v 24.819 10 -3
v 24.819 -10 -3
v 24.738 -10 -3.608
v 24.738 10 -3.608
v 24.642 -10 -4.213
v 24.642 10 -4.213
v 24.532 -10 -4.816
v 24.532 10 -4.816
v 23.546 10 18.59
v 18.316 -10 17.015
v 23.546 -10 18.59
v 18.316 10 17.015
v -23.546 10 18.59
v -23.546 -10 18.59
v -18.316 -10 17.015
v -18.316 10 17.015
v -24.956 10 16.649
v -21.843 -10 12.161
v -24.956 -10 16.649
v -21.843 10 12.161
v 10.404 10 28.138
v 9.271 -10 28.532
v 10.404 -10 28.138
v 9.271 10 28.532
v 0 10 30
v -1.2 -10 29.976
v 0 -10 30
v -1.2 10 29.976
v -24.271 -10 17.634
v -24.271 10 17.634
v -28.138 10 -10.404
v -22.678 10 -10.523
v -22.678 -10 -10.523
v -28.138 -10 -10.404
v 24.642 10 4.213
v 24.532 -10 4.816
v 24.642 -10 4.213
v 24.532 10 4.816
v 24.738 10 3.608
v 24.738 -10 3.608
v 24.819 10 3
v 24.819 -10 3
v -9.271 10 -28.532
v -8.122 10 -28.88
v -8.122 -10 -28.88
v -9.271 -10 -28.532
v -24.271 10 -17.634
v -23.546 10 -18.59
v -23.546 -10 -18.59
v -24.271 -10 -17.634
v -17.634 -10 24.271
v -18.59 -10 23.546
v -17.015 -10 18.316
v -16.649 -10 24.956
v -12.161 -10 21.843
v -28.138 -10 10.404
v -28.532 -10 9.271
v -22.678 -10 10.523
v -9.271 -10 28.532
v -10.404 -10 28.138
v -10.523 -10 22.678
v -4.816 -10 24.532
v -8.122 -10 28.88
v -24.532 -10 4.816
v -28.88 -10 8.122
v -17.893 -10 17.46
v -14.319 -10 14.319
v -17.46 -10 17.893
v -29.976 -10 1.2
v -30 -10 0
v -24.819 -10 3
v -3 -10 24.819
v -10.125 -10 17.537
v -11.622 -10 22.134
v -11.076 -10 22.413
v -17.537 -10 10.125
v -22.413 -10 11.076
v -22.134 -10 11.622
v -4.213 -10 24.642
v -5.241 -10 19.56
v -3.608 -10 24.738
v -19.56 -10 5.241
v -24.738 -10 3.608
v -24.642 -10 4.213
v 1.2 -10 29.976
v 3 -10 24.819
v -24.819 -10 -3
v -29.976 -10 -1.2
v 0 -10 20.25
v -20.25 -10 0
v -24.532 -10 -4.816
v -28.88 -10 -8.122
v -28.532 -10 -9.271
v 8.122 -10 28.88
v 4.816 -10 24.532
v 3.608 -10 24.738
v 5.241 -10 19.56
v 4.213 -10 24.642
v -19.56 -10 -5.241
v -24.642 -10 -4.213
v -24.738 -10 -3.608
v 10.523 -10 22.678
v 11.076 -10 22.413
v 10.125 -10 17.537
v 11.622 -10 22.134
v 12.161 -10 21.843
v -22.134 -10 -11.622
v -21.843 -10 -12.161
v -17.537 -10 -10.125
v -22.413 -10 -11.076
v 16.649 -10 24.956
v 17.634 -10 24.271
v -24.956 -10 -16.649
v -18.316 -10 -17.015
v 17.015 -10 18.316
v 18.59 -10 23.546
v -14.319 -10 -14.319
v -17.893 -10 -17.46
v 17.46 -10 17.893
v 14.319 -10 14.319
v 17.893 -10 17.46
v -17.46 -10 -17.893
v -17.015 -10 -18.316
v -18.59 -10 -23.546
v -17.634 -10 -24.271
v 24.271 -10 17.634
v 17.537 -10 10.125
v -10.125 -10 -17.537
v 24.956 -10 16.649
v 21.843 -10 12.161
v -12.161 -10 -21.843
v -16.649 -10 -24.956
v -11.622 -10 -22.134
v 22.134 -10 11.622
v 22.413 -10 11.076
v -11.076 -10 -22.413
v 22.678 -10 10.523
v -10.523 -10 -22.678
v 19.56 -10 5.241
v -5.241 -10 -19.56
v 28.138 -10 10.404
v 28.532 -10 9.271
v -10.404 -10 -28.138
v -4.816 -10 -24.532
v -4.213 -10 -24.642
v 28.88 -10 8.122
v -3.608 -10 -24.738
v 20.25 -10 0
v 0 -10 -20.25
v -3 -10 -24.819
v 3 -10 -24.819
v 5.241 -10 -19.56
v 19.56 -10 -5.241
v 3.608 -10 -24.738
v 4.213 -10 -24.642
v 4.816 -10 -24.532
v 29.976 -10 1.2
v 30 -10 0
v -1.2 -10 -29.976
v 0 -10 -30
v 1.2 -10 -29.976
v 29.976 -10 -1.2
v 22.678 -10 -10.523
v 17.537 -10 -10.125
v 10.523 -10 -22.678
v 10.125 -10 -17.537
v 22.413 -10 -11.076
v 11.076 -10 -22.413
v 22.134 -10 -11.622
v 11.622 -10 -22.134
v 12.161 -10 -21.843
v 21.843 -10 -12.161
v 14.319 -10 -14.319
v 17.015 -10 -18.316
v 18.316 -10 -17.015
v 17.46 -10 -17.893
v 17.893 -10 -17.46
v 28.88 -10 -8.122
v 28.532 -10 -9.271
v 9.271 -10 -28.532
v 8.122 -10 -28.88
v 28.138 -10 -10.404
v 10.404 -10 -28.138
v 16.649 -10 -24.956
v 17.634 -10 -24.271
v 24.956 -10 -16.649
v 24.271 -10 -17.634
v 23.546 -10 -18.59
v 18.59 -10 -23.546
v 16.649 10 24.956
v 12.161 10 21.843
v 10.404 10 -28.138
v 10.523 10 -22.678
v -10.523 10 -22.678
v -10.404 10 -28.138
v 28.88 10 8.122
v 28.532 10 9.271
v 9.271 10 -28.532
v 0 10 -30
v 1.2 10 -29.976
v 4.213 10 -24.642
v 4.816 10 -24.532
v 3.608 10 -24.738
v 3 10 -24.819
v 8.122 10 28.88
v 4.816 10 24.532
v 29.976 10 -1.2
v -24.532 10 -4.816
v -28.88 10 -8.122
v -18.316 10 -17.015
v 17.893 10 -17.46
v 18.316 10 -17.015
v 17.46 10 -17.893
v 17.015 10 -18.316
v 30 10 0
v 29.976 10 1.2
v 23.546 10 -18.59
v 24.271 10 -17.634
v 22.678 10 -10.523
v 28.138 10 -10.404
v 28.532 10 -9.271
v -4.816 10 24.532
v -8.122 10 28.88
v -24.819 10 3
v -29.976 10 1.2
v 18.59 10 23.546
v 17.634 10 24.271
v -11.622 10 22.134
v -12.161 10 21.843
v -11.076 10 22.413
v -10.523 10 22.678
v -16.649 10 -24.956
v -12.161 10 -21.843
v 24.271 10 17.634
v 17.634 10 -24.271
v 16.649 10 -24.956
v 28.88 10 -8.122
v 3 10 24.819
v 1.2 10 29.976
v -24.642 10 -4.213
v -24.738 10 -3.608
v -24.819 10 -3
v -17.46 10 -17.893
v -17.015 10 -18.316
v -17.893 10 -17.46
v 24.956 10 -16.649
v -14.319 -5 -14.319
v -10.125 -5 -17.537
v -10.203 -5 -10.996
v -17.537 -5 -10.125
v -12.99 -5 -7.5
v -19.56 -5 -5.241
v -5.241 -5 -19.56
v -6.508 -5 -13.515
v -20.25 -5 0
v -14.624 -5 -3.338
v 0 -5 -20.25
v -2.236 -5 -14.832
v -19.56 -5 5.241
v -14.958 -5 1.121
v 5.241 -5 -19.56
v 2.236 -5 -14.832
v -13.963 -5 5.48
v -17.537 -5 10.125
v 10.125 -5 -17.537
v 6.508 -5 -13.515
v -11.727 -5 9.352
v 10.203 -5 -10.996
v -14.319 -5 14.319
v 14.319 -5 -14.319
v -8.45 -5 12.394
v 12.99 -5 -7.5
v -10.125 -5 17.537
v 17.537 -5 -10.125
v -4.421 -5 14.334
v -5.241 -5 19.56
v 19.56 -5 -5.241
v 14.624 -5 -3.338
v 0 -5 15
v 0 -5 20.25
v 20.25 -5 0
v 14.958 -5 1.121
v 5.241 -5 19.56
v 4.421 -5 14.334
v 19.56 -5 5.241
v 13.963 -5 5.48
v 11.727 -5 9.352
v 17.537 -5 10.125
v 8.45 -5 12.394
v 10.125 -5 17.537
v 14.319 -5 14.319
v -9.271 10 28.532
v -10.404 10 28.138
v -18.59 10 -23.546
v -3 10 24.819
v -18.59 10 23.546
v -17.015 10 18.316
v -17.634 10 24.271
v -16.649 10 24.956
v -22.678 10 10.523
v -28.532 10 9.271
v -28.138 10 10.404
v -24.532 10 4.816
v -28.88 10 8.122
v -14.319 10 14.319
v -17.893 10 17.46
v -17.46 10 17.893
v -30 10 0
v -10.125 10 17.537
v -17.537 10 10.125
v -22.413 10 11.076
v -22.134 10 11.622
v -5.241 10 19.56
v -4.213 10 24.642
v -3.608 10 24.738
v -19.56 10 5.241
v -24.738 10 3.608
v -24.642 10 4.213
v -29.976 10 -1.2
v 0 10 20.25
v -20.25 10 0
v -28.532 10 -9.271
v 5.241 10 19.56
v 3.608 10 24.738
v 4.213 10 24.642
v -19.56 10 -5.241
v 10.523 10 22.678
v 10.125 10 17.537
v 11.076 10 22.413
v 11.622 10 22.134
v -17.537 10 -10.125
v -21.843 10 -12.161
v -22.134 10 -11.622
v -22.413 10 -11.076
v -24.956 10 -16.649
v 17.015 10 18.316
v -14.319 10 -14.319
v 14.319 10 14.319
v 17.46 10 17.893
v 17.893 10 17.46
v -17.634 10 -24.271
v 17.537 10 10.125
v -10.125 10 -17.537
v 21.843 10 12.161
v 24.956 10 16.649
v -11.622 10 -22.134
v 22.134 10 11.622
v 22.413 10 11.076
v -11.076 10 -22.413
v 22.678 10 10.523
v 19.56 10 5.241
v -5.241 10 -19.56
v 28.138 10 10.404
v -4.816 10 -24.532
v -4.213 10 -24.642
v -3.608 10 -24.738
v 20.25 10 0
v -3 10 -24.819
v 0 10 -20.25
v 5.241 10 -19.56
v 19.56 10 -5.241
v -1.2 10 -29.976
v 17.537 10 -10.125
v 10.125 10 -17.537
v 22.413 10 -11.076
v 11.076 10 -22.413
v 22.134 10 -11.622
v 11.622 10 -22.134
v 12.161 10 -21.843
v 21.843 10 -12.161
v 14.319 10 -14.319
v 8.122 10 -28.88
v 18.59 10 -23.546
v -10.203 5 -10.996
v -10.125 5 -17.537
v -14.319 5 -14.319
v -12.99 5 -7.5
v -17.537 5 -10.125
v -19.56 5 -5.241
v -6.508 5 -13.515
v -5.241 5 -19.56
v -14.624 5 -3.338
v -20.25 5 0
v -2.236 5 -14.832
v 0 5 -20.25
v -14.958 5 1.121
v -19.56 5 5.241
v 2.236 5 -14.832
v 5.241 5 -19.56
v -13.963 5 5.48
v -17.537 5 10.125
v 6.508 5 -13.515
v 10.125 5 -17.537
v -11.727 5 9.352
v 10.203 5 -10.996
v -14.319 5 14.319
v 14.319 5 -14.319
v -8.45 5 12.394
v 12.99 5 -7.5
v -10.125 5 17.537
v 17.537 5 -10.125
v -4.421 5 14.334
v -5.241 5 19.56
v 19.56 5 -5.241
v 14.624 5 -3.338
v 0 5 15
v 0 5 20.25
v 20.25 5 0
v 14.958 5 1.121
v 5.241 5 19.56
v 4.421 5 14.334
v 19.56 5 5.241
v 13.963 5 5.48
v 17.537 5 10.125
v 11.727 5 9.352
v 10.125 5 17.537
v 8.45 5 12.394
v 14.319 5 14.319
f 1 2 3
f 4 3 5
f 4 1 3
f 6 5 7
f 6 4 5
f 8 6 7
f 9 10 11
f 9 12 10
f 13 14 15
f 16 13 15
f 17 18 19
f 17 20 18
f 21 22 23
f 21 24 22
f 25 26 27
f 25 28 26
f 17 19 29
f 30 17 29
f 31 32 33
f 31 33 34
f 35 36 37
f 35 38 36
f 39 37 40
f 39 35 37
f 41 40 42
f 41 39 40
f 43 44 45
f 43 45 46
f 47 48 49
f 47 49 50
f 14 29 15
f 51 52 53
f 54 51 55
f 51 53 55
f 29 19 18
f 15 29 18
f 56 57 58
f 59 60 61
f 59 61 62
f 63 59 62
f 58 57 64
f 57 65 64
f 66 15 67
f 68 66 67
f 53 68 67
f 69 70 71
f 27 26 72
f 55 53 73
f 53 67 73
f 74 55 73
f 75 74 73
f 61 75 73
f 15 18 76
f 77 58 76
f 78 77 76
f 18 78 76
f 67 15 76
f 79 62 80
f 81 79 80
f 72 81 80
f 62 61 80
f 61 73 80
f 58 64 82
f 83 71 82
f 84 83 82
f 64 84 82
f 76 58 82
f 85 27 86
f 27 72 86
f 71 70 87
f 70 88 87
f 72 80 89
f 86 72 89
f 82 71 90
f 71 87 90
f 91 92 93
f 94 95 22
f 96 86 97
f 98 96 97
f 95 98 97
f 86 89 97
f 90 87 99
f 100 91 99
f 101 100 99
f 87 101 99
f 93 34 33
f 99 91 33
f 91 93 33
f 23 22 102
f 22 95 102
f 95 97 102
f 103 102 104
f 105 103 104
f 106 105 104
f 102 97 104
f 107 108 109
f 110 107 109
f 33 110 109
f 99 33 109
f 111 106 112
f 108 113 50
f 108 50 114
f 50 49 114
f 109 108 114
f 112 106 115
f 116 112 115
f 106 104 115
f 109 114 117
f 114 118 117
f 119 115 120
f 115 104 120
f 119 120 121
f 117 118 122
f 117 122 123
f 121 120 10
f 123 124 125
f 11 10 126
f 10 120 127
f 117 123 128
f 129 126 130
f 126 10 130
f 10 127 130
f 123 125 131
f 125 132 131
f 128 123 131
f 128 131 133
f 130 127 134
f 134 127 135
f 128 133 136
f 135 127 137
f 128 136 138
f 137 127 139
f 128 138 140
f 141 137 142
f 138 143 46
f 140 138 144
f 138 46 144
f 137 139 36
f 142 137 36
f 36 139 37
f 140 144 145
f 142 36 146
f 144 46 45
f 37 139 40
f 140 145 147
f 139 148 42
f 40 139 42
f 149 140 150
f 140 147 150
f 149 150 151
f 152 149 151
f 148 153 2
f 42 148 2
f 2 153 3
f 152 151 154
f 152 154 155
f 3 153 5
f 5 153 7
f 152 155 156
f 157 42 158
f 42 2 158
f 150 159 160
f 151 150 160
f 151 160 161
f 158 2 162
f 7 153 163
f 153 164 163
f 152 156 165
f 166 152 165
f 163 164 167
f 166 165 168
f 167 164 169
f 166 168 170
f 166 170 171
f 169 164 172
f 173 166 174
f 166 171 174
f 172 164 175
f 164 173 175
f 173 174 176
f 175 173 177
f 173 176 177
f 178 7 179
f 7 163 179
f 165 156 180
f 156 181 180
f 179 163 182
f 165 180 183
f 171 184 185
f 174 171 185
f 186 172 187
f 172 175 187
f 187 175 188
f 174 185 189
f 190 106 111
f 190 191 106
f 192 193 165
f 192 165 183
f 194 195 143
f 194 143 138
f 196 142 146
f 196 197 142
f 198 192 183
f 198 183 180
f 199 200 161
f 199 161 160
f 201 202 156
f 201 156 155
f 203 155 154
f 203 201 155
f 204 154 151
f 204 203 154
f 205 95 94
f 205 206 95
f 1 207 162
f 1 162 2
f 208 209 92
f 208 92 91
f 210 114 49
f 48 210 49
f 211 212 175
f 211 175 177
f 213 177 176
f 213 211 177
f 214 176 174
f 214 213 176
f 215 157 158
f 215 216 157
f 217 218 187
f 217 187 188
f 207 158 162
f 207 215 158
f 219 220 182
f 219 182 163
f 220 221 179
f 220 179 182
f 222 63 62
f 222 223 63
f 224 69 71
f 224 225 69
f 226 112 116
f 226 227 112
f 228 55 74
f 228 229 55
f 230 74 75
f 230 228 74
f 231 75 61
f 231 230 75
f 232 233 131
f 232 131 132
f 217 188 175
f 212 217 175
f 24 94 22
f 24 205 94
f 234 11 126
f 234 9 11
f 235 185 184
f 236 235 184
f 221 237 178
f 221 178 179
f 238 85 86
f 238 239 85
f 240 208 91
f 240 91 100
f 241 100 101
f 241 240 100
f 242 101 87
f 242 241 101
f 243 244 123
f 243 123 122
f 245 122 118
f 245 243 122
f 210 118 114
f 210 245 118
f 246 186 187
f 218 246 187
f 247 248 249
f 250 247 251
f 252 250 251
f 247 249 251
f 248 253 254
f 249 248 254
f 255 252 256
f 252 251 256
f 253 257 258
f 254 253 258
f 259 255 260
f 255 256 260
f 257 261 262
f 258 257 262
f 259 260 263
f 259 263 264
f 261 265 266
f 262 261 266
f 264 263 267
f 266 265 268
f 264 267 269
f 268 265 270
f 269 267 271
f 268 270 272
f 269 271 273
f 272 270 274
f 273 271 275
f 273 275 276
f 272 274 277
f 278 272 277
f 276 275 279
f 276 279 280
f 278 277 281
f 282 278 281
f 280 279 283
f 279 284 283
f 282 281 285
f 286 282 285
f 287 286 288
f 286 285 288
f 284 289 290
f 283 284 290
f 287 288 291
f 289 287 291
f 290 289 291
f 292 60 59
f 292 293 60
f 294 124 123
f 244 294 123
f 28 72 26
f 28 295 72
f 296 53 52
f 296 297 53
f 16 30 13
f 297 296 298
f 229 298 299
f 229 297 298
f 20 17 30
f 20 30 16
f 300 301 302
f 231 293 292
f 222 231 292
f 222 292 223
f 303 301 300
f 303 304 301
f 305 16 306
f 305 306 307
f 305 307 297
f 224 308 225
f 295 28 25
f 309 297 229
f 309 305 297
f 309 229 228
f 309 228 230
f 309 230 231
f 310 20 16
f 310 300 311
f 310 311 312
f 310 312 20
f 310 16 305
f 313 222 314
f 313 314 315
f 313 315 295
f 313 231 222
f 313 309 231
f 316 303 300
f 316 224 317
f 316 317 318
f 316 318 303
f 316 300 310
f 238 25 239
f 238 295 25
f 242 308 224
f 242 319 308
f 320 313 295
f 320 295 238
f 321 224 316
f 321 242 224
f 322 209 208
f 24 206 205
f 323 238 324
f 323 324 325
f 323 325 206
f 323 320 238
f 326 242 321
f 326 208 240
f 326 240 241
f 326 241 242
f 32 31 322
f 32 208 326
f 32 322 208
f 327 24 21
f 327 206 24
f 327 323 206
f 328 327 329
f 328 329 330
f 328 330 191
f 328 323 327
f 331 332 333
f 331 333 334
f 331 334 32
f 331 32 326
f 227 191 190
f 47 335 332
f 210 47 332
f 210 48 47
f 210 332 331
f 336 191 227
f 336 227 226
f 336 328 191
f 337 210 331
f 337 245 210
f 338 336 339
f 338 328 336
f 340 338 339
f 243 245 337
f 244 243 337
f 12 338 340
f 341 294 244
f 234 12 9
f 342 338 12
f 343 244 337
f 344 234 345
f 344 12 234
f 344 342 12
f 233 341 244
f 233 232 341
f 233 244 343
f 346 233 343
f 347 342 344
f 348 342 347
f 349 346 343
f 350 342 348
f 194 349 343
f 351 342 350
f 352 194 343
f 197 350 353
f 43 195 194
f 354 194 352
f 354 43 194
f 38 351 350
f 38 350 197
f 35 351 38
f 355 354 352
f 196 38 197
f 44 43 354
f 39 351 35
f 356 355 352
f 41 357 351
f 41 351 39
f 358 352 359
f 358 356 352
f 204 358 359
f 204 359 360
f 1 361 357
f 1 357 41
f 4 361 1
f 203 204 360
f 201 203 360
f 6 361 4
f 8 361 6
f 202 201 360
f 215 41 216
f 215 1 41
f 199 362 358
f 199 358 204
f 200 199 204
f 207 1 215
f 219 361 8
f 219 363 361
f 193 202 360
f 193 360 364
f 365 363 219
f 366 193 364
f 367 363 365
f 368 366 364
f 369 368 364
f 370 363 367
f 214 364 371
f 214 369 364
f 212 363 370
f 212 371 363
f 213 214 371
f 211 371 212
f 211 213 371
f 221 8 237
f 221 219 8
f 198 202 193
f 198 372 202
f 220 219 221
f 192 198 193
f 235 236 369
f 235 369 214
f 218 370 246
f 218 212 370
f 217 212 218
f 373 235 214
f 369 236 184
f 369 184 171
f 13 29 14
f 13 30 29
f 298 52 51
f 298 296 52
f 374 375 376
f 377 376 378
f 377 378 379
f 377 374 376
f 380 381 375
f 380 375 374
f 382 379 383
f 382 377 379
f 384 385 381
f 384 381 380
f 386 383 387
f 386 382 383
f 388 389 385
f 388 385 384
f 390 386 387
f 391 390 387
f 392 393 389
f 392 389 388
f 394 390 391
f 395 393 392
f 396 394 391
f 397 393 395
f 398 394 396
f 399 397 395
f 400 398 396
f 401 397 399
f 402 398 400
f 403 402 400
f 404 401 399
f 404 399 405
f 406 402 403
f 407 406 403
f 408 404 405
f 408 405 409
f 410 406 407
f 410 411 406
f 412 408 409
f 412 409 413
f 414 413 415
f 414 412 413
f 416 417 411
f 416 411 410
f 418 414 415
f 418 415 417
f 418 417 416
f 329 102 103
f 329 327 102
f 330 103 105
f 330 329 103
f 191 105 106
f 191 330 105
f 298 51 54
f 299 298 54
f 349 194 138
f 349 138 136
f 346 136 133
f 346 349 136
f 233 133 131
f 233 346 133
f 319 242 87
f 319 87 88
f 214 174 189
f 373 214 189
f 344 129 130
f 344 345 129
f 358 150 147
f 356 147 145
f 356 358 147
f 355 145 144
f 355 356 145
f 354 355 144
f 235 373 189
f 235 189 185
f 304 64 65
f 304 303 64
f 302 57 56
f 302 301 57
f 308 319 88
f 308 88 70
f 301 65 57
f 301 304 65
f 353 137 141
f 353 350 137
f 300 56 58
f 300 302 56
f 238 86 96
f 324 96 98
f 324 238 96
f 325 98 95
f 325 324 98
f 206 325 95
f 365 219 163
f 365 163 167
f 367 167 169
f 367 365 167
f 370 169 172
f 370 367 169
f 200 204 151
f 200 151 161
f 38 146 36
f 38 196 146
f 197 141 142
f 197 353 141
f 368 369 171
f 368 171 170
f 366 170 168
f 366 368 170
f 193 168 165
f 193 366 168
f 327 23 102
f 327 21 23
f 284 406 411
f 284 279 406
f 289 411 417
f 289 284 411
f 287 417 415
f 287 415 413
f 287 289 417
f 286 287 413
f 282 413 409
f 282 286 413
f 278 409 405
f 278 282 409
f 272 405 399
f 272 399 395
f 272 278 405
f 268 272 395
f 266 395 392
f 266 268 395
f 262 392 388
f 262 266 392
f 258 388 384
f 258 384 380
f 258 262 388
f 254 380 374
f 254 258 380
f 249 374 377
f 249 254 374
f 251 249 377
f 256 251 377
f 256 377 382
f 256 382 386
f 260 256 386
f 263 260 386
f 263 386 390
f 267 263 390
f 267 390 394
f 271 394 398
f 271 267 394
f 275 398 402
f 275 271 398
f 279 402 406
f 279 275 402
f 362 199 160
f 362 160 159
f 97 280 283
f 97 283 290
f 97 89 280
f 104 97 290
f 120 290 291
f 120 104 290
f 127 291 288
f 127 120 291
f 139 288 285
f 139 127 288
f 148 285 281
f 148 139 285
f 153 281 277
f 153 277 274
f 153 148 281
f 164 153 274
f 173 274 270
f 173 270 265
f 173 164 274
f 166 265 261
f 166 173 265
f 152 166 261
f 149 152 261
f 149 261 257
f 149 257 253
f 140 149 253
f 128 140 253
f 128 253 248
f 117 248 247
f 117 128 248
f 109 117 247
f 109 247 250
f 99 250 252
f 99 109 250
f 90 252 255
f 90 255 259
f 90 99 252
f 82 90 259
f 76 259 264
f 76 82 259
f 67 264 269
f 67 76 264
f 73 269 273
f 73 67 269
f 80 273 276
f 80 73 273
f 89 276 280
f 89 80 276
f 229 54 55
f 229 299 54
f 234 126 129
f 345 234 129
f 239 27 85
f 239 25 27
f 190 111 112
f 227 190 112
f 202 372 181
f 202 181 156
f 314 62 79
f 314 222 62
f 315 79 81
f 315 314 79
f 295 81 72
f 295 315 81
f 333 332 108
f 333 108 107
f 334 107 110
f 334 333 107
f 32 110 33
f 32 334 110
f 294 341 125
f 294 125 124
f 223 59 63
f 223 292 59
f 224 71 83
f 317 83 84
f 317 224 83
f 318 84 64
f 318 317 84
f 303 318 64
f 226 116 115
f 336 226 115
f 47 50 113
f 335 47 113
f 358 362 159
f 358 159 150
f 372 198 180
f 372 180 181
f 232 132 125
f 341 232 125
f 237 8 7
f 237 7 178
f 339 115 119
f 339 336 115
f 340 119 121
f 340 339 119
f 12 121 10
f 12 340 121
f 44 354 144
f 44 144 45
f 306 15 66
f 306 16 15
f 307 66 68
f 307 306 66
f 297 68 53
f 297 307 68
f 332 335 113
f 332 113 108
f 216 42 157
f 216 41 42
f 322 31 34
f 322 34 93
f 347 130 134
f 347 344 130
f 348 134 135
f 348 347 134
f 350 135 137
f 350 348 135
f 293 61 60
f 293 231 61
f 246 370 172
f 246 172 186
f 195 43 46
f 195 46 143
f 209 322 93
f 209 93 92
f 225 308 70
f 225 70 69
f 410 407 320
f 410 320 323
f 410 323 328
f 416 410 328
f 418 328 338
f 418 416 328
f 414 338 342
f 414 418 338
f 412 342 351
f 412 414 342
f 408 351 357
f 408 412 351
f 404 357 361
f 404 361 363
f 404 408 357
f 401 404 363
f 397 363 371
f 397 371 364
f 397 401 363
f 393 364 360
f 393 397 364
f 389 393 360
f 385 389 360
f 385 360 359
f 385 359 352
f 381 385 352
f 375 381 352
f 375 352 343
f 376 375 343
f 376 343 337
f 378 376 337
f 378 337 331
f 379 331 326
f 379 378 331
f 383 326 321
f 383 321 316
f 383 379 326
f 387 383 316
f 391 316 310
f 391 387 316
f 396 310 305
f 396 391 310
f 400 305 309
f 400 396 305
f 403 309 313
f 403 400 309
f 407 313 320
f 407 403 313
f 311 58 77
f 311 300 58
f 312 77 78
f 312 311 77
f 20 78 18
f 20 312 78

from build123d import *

# Parameters (mm, degrees)
SKETCH1_R           = 20.25
BOSS_EXTRUDE1_DEPTH = 10
SKETCH1_3_R         = 20.25
SKETCH1_3_R_2       = 15
BOSS_EXTRUDE2_DEPTH = 5


with BuildPart() as part:
    # Sketch1 → Boss-Extrude1 (new, symmetric)
    with BuildSketch(Plane(origin=(0, 0, 0), x_dir=(1, 0, 0), z_dir=(0, 1, 0))):
        with BuildLine():
            Line((29.976, -1.199759976), (30, 0))
            Line((30, 0), (29.976, 1.199759976))
            Line((29.976, 1.199759976), (24.819347292, 3))
            ThreePointArc((24.819347292, 3), (24.692208515, 3.910861626), (24.531652955, 4.816430554))
            Line((24.531652955, 4.816430554), (28.879616354, 8.12205388))
            Line((28.879616354, 8.12205388), (28.531695489, 9.270509831))
            Line((28.531695489, 9.270509831), (28.138123911, 10.404132967))
            Line((28.138123911, 10.404132967), (22.677550989, 10.522769651))
            ThreePointArc((22.677550989, 10.522769651), (22.275163105, 11.349762493), (21.842629505, 12.161395327))
            Line((21.842629505, 12.161395327), (24.956294644, 16.648824513))
            Line((24.956294644, 16.648824513), (24.270509831, 17.633557569))
            Line((24.270509831, 17.633557569), (23.545892203, 18.590076932))
            Line((23.545892203, 18.590076932), (18.315917992, 17.015497293))
            ThreePointArc((18.315917992, 17.015497293), (17.67766953, 17.67766953), (17.015497293, 18.315917992))
            Line((17.015497293, 18.315917992), (18.590076932, 23.545892203))
            Line((18.590076932, 23.545892203), (17.633557569, 24.270509831))
            Line((17.633557569, 24.270509831), (16.648824513, 24.956294644))
            Line((16.648824513, 24.956294644), (12.161395327, 21.842629505))
            ThreePointArc((12.161395327, 21.842629505), (11.349762493, 22.275163105), (10.522769651, 22.677550989))
            Line((10.522769651, 22.677550989), (10.404132967, 28.138123911))
            Line((10.404132967, 28.138123911), (9.270509831, 28.531695489))
            Line((9.270509831, 28.531695489), (8.12205388, 28.879616354))
            Line((8.12205388, 28.879616354), (4.816430554, 24.531652955))
            ThreePointArc((4.816430554, 24.531652955), (3.910861626, 24.692208515), (3, 24.819347292))
            Line((3, 24.819347292), (1.199759976, 29.976))
            Line((1.199759976, 29.976), (0, 30))
            Line((0, 30), (-1.199759976, 29.976))
            Line((-1.199759976, 29.976), (-3, 24.819347292))
            ThreePointArc((-3, 24.819347292), (-3.910861626, 24.692208515), (-4.816430554, 24.531652955))
            Line((-4.816430554, 24.531652955), (-8.12205388, 28.879616354))
            Line((-8.12205388, 28.879616354), (-9.270509831, 28.531695489))
            Line((-9.270509831, 28.531695489), (-10.404132967, 28.138123911))
            Line((-10.404132967, 28.138123911), (-10.522769651, 22.677550989))
            ThreePointArc((-10.522769651, 22.677550989), (-11.349762493, 22.275163105), (-12.161395327, 21.842629505))
            Line((-12.161395327, 21.842629505), (-16.648824513, 24.956294644))
            Line((-16.648824513, 24.956294644), (-17.633557569, 24.270509831))
            Line((-17.633557569, 24.270509831), (-18.590076932, 23.545892203))
            Line((-18.590076932, 23.545892203), (-17.015497293, 18.315917992))
            ThreePointArc((-17.015497293, 18.315917992), (-17.67766953, 17.67766953), (-18.315917992, 17.015497293))
            Line((-18.315917992, 17.015497293), (-23.545892203, 18.590076932))
            Line((-23.545892203, 18.590076932), (-24.270509831, 17.633557569))
            Line((-24.270509831, 17.633557569), (-24.956294644, 16.648824513))
            Line((-24.956294644, 16.648824513), (-21.842629505, 12.161395327))
            ThreePointArc((-21.842629505, 12.161395327), (-22.275163105, 11.349762493), (-22.677550989, 10.522769651))
            Line((-22.677550989, 10.522769651), (-28.138123911, 10.404132967))
            Line((-28.138123911, 10.404132967), (-28.531695489, 9.270509831))
            Line((-28.531695489, 9.270509831), (-28.879616354, 8.12205388))
            Line((-28.879616354, 8.12205388), (-24.531652955, 4.816430554))
            ThreePointArc((-24.531652955, 4.816430554), (-24.692208515, 3.910861626), (-24.819347292, 3))
            Line((-24.819347292, 3), (-29.976, 1.199759976))
            Line((-29.976, 1.199759976), (-30, 0))
            Line((-30, 0), (-29.976, -1.199759976))
            Line((-29.976, -1.199759976), (-24.819347292, -3))
            ThreePointArc((-24.819347292, -3), (-24.692208515, -3.910861626), (-24.531652955, -4.816430554))
            Line((-24.531652955, -4.816430554), (-28.879616354, -8.12205388))
            Line((-28.879616354, -8.12205388), (-28.531695489, -9.270509831))
            Line((-28.531695489, -9.270509831), (-28.138123911, -10.404132967))
            Line((-28.138123911, -10.404132967), (-22.677550989, -10.522769651))
            ThreePointArc((-22.677550989, -10.522769651), (-22.275163105, -11.349762493), (-21.842629505, -12.161395327))
            Line((-21.842629505, -12.161395327), (-24.956294644, -16.648824513))
            Line((-24.956294644, -16.648824513), (-24.270509831, -17.633557569))
            Line((-24.270509831, -17.633557569), (-23.545892203, -18.590076932))
            Line((-23.545892203, -18.590076932), (-18.315917992, -17.015497293))
            ThreePointArc((-18.315917992, -17.015497293), (-17.67766953, -17.67766953), (-17.015497293, -18.315917992))
            Line((-17.015497293, -18.315917992), (-18.590076932, -23.545892203))
            Line((-18.590076932, -23.545892203), (-17.633557569, -24.270509831))
            Line((-17.633557569, -24.270509831), (-16.648824513, -24.956294644))
            Line((-16.648824513, -24.956294644), (-12.161395327, -21.842629505))
            ThreePointArc((-12.161395327, -21.842629505), (-11.349762493, -22.275163105), (-10.522769651, -22.677550989))
            Line((-10.522769651, -22.677550989), (-10.404132967, -28.138123911))
            Line((-10.404132967, -28.138123911), (-9.270509831, -28.531695489))
            Line((-9.270509831, -28.531695489), (-8.12205388, -28.879616354))
            Line((-8.12205388, -28.879616354), (-4.816430554, -24.531652955))
            ThreePointArc((-4.816430554, -24.531652955), (-3.910861626, -24.692208515), (-3, -24.819347292))
            Line((-3, -24.819347292), (-1.199759976, -29.976))
            Line((-1.199759976, -29.976), (0, -30))
            Line((0, -30), (1.199759976, -29.976))
            Line((1.199759976, -29.976), (3, -24.819347292))
            ThreePointArc((3, -24.819347292), (3.910861626, -24.692208515), (4.816430554, -24.531652955))
            Line((4.816430554, -24.531652955), (8.12205388, -28.879616354))
            Line((8.12205388, -28.879616354), (9.270509831, -28.531695489))
            Line((9.270509831, -28.531695489), (10.404132967, -28.138123911))
            Line((10.404132967, -28.138123911), (10.522769651, -22.677550989))
            ThreePointArc((10.522769651, -22.677550989), (11.349762493, -22.275163105), (12.161395327, -21.842629505))
            Line((12.161395327, -21.842629505), (16.648824513, -24.956294644))
            Line((16.648824513, -24.956294644), (17.633557569, -24.270509831))
            Line((17.633557569, -24.270509831), (18.590076932, -23.545892203))
            Line((18.590076932, -23.545892203), (17.015497293, -18.315917992))
            ThreePointArc((17.015497293, -18.315917992), (17.67766953, -17.67766953), (18.315917992, -17.015497293))
            Line((18.315917992, -17.015497293), (23.545892203, -18.590076932))
            Line((23.545892203, -18.590076932), (24.270509831, -17.633557569))
            Line((24.270509831, -17.633557569), (24.956294644, -16.648824513))
            Line((24.956294644, -16.648824513), (21.842629505, -12.161395327))
            ThreePointArc((21.842629505, -12.161395327), (22.275163105, -11.349762493), (22.677550989, -10.522769651))
            Line((22.677550989, -10.522769651), (28.138123911, -10.404132967))
            Line((28.138123911, -10.404132967), (28.531695489, -9.270509831))
            Line((28.531695489, -9.270509831), (28.879616354, -8.12205388))
            Line((28.879616354, -8.12205388), (24.531652955, -4.816430554))
            ThreePointArc((24.531652955, -4.816430554), (24.692208515, -3.910861626), (24.819347292, -3))
            Line((24.819347292, -3), (29.976, -1.199759976))
        make_face()
        Circle(SKETCH1_R, mode=Mode.SUBTRACT)
    extrude(amount=BOSS_EXTRUDE1_DEPTH, both=True)

    # Sketch1<3> → Boss-Extrude2 (add, symmetric)
    with BuildSketch(Plane(origin=(0, 0, 0), x_dir=(1, 0, 0), z_dir=(0, 1, 0))):
        Circle(SKETCH1_3_R)
        Circle(SKETCH1_3_R_2, mode=Mode.SUBTRACT)
    extrude(amount=BOSS_EXTRUDE2_DEPTH, both=True)


solid = part.part
